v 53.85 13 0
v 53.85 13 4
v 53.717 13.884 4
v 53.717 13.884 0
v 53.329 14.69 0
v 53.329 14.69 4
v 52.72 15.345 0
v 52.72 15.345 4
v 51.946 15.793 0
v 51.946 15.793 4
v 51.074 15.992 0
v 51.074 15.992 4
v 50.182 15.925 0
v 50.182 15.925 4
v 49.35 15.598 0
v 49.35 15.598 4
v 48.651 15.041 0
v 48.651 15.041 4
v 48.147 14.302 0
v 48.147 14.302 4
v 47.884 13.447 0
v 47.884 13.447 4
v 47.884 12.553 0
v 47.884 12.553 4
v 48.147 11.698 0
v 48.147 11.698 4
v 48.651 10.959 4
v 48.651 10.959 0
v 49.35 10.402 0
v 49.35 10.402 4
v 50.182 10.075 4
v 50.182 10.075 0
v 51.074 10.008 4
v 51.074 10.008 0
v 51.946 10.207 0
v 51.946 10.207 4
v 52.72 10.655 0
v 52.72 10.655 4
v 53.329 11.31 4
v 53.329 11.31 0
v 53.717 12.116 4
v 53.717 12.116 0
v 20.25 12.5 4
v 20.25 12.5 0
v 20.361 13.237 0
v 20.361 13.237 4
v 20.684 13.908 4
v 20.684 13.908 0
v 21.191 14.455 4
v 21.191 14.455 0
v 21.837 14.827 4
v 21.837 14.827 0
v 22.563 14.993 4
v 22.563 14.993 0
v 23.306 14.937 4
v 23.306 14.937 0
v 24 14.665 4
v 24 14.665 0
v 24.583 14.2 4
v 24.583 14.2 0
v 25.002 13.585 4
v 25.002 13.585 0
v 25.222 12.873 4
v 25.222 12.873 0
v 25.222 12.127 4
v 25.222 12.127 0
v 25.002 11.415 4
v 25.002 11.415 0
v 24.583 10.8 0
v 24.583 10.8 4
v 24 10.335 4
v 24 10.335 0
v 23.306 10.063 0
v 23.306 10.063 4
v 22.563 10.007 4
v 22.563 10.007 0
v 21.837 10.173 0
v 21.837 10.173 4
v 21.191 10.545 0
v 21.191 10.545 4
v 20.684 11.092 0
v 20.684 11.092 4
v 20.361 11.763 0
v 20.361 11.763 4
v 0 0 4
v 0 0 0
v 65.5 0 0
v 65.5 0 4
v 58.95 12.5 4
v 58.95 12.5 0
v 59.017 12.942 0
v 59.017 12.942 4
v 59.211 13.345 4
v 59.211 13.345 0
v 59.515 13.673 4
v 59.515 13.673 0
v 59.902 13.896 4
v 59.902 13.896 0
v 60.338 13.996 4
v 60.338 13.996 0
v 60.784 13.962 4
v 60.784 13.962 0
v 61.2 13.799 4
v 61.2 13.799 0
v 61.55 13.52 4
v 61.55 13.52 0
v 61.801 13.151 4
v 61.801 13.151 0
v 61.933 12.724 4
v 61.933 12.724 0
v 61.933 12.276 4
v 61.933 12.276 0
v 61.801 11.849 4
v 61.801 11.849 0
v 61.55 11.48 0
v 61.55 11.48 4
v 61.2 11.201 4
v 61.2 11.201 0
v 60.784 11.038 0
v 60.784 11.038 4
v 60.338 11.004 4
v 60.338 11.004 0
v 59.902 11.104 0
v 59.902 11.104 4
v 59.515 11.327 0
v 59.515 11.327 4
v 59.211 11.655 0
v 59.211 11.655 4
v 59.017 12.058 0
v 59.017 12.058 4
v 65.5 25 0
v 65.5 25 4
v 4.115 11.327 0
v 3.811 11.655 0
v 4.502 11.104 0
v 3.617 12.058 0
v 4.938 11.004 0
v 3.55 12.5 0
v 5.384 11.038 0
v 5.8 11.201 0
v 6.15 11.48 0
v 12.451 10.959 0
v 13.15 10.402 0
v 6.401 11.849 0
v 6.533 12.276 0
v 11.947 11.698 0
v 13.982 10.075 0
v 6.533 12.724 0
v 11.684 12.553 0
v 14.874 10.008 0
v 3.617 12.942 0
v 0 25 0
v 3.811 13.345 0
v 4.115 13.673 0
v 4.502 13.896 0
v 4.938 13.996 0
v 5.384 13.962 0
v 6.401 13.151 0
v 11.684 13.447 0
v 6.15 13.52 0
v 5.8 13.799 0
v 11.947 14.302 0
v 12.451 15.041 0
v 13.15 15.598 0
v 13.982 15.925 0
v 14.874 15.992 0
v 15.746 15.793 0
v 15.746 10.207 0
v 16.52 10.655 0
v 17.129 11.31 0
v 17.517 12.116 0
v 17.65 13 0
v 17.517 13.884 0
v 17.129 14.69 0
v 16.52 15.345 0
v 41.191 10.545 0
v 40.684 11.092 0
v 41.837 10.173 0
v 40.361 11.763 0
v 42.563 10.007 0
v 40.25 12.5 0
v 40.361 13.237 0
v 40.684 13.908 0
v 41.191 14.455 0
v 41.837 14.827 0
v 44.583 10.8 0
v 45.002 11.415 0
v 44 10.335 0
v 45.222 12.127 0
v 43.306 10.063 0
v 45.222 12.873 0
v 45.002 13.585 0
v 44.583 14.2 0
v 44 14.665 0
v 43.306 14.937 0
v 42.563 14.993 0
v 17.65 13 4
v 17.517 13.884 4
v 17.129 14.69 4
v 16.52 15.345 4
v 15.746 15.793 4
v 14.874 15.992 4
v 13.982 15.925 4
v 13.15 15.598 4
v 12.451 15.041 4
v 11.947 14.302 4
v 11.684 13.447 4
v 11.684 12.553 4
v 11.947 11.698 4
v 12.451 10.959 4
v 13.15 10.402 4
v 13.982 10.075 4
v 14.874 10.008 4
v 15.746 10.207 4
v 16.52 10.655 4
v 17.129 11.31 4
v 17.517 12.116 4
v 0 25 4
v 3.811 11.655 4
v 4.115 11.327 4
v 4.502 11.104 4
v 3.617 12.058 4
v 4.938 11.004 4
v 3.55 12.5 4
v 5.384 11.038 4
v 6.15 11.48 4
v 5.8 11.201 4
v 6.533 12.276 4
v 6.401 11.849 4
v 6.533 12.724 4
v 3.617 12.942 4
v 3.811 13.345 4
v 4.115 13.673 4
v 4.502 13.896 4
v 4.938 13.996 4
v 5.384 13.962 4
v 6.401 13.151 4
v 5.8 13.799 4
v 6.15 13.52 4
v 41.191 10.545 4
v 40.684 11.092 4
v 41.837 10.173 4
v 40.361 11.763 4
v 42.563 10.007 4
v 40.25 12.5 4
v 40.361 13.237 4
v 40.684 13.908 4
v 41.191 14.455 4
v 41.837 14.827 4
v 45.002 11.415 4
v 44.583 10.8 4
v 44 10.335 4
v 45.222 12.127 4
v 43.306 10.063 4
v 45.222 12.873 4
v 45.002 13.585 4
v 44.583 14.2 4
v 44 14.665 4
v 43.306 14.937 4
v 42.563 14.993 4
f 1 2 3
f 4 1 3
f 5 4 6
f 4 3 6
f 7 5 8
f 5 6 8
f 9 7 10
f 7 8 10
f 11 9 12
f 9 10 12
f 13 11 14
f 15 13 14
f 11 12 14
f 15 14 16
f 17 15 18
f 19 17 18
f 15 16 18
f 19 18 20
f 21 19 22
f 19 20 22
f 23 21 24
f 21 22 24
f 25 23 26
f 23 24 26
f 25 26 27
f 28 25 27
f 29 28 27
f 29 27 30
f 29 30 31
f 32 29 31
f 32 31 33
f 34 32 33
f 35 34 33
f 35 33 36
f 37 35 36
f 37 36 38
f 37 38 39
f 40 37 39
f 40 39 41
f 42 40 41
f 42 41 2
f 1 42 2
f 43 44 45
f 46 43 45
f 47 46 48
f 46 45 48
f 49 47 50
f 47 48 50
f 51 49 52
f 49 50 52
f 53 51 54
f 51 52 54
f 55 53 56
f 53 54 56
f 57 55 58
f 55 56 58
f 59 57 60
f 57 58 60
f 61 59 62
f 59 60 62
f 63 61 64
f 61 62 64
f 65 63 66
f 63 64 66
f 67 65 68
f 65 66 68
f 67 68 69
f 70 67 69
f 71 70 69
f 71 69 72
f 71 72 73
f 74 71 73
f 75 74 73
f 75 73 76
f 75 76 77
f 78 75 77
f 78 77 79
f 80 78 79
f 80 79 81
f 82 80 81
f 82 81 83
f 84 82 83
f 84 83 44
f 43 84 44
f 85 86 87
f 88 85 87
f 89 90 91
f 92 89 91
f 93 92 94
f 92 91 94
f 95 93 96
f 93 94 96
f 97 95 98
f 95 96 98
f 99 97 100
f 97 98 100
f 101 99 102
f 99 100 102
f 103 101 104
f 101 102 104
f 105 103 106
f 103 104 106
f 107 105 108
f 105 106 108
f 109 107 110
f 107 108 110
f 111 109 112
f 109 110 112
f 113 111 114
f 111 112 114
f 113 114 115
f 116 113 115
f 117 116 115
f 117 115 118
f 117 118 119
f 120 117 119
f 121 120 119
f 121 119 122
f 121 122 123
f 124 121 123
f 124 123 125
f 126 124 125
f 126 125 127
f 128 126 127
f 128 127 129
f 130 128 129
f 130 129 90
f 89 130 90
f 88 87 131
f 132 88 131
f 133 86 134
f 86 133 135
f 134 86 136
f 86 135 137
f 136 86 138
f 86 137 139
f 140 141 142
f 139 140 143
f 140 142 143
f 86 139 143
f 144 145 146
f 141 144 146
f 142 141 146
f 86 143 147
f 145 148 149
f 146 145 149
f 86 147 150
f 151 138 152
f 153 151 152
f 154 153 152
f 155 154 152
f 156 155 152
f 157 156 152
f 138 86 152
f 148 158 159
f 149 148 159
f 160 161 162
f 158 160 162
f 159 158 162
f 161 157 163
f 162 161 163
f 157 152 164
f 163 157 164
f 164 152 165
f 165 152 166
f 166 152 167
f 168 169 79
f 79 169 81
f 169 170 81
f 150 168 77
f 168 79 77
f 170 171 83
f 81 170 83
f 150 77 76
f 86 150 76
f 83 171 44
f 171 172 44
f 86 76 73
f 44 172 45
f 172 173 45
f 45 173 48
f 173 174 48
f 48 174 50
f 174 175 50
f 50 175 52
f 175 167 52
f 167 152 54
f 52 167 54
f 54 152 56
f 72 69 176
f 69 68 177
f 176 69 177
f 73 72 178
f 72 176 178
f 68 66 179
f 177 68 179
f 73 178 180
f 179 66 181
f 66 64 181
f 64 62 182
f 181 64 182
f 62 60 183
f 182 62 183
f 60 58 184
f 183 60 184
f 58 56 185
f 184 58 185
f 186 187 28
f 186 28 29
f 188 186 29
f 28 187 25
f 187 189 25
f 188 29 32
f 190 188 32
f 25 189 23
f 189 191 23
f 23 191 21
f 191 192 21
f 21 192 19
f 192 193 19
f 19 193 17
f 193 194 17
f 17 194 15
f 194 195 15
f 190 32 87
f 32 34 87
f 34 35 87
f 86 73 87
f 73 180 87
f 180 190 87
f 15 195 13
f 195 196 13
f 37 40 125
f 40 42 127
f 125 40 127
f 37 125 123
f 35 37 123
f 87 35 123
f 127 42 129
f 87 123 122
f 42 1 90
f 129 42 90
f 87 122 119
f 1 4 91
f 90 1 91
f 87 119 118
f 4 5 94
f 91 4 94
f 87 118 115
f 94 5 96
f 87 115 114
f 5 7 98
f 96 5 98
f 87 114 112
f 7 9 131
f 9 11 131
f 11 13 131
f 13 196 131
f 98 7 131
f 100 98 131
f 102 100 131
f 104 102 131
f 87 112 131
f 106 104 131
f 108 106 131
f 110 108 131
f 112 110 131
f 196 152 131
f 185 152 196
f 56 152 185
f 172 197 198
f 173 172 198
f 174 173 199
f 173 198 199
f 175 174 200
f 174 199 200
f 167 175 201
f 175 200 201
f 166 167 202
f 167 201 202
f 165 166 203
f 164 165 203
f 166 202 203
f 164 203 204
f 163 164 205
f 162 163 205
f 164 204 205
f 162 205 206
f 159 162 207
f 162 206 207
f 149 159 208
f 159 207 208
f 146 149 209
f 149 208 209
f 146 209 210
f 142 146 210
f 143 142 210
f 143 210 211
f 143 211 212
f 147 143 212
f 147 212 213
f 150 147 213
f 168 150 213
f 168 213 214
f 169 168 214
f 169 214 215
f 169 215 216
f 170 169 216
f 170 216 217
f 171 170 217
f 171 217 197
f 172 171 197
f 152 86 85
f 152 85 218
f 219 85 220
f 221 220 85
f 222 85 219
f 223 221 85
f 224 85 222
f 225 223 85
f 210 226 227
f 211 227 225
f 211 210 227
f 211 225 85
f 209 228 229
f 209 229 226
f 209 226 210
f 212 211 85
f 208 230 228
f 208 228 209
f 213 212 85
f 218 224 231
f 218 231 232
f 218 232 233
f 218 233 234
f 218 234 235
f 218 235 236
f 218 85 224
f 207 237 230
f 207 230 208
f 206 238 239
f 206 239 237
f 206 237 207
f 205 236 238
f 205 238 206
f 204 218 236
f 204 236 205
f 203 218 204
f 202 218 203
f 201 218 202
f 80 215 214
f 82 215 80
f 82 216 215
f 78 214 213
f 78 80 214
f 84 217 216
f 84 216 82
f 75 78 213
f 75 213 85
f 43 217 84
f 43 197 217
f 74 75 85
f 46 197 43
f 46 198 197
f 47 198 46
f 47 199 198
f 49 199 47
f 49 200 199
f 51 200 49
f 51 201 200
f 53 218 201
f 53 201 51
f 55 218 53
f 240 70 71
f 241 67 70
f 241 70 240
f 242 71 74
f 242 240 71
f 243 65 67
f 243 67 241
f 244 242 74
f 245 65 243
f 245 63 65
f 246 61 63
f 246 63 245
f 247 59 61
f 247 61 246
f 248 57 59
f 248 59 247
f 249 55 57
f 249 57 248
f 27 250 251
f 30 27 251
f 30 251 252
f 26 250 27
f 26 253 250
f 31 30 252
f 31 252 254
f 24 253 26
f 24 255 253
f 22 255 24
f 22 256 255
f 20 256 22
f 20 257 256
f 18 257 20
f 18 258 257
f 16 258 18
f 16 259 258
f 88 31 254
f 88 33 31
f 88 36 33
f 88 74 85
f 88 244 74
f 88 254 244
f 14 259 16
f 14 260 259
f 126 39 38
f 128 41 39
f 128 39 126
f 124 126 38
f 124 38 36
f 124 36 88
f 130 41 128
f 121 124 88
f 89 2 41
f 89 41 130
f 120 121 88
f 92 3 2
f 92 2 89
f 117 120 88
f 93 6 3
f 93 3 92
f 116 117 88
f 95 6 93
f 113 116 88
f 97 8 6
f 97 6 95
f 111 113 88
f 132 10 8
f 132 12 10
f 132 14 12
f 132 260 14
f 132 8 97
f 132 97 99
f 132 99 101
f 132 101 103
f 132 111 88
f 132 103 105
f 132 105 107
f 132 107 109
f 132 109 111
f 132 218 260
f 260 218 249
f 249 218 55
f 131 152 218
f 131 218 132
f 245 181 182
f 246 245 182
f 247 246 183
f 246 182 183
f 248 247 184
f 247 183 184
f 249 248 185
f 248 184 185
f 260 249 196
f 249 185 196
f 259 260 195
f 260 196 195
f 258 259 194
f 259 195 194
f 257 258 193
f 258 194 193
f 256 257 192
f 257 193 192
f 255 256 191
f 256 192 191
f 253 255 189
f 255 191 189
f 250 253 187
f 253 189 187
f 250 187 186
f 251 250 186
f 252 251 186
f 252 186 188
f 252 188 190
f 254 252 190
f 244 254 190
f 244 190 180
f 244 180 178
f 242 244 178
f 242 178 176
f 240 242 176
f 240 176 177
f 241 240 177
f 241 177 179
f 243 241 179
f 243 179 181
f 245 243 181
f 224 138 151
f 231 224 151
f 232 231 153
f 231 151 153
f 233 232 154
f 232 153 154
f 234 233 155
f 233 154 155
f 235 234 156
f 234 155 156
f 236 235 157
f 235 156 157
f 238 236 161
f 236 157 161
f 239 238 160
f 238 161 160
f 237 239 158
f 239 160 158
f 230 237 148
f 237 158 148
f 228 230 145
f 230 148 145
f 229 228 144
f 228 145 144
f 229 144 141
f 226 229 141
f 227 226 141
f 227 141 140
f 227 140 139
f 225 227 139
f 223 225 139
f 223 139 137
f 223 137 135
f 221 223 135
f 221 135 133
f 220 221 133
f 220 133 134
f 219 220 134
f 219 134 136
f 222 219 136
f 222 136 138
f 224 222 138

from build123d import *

# Parameters (mm, degrees)
SKETCH1_W             = 65.5
SKETCH1_H             = 25
BOSS_EXTRUDE1_DEPTH   = 4
F_5_0MM_DOWEL_HOLE1_D = 5
SKETCH4_R             = 3
CUT_EXTRUDE1_DEPTH    = 71.222859526
F_3_0MM_DOWEL_HOLE1_D = 3


with BuildPart() as part:
    # Sketch1 → Boss-Extrude1 (new body)
    with BuildSketch(Plane.XY):
        with Locations((32.75, 12.5)):
            Rectangle(SKETCH1_W, SKETCH1_H)
    extrude(amount=BOSS_EXTRUDE1_DEPTH)

    # Ø5.0mm Dowel Hole1 (through all)
    with Locations(Plane.XY.offset(4)):
        with Locations((22.75, 12.5), (42.75, 12.5)):
            Hole(F_5_0MM_DOWEL_HOLE1_D / 2)

    # Sketch4 → Cut-Extrude1 (cut, through all)
    with BuildSketch(Plane.XY.offset(4)):
        with Locations((14.65, 13)):
            Circle(SKETCH4_R)
        with Locations((50.85, 13)):
            Circle(SKETCH4_R)
    extrude(amount=-CUT_EXTRUDE1_DEPTH, mode=Mode.SUBTRACT)

    # Ø3.0mm Dowel Hole1 (through all)
    with Locations(Plane.XY.offset(4)):
        with Locations((5.05, 12.5), (60.45, 12.5)):
            Hole(F_3_0MM_DOWEL_HOLE1_D / 2)


solid = part.part
